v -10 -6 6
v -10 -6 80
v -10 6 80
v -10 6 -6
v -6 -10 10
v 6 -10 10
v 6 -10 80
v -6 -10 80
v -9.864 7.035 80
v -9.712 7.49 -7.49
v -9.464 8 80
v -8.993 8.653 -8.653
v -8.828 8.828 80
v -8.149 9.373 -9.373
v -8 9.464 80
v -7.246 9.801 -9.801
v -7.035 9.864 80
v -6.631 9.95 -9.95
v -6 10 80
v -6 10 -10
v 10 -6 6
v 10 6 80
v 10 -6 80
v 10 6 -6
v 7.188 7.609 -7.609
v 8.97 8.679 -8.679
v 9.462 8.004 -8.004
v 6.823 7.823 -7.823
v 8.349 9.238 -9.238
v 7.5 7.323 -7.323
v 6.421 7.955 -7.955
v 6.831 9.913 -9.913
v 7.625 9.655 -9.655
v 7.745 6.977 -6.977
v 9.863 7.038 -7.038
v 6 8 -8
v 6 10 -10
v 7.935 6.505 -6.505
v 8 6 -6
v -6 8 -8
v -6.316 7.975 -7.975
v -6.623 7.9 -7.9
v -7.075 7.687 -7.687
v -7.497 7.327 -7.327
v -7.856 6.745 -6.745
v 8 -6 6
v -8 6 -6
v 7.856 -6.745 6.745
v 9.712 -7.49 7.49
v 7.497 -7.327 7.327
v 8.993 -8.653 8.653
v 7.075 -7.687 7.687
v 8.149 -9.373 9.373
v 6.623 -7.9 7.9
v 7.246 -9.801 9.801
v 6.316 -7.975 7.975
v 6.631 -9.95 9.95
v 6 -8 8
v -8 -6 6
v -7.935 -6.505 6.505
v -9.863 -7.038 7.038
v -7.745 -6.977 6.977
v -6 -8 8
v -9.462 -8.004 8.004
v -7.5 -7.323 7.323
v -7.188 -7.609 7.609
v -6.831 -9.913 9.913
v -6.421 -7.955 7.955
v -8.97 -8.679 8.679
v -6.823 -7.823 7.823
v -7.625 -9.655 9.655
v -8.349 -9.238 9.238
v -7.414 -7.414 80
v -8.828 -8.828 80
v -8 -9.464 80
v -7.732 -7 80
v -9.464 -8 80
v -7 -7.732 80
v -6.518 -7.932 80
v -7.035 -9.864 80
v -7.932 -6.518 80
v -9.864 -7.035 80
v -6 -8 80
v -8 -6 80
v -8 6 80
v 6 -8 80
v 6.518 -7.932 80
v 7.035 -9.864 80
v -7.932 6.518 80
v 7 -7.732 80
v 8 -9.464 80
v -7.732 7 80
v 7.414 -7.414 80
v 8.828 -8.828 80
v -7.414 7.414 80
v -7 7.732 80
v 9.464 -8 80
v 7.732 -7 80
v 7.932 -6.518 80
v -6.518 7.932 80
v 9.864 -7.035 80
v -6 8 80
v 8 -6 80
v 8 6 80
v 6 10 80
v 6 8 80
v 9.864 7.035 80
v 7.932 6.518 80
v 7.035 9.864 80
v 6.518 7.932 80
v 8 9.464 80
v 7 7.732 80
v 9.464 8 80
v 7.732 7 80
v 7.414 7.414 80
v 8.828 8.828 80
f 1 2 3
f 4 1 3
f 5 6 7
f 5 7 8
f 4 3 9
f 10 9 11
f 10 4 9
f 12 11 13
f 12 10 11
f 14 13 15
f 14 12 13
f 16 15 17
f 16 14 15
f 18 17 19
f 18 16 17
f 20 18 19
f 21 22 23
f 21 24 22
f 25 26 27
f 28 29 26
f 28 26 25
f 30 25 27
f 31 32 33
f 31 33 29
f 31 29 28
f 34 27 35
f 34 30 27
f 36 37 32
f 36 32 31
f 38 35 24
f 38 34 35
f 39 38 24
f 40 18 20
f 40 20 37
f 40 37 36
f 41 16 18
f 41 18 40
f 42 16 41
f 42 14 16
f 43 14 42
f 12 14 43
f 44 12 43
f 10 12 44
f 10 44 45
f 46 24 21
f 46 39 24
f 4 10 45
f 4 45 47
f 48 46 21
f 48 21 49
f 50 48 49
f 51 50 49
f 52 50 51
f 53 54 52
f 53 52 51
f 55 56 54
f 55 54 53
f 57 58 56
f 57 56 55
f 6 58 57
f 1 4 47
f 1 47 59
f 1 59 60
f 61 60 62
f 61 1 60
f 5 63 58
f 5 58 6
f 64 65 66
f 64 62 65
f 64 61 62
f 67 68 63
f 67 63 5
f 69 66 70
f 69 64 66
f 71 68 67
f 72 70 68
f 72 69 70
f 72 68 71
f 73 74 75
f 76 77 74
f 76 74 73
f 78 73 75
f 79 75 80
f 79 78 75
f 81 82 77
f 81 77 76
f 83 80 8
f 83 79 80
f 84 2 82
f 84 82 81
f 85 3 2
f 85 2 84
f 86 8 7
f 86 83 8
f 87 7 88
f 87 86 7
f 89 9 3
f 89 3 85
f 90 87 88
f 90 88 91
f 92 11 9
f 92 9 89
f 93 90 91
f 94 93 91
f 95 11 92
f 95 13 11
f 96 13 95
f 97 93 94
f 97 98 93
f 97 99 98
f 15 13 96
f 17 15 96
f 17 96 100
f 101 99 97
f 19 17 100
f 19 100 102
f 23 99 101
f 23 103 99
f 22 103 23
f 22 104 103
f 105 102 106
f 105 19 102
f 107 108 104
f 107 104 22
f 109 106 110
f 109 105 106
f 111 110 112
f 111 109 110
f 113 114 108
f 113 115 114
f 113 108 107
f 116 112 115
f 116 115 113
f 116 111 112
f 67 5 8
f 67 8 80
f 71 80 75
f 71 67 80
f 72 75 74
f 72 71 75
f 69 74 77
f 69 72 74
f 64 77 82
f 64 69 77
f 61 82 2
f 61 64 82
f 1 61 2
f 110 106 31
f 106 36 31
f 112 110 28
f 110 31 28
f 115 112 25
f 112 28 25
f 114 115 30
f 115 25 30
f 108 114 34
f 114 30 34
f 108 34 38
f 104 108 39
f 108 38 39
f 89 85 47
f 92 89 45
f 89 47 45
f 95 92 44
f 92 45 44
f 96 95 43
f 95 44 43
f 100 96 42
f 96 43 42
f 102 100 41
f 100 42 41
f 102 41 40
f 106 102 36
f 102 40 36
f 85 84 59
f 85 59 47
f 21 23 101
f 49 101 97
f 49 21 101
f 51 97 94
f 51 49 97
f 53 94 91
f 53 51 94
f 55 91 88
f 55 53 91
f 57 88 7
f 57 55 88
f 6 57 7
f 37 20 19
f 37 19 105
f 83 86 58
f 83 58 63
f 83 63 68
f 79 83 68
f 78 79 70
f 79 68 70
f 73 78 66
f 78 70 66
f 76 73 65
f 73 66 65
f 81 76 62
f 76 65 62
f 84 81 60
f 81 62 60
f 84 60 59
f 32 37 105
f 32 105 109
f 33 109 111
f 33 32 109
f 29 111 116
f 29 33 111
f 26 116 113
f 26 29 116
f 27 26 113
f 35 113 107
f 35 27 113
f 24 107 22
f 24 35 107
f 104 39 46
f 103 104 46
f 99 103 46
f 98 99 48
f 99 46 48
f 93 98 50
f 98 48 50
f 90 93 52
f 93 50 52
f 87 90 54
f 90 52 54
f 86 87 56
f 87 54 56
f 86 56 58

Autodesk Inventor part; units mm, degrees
ref_plane "Start Plane" through (0, 0, -10) normal (0, 0, 1) x (1, 0, 0)
ref_plane "End Plane" through (0, 0, 80) normal (0, 0, 1) x (1, 0, 0)
sketch "Sketch" plane through (0, 0, 0) normal (0, 0, 1) x (1, 0, 0)
  line L0 (-10, -6) -> (-10, 6)
  line L1 (-6, 10) -> (6, 10)
  line L2 (10, 6) -> (10, -6)
  line L3 (6, -10) -> (-6, -10)
  arc A0 (-10, -6) -> (-6, -10) centre (-6, -6) ccw
  arc A1 (10, 6) -> (6, 10) centre (6, 6) ccw
  arc A2 (-6, 10) -> (-10, 6) centre (-6, 6) ccw
  arc A3 (6, -10) -> (10, -6) centre (6, -6) ccw
  arc A4 (-6, 8) -> (-8, 6) centre (-6, 6) ccw
  line L4 (-6, 8) -> (6, 8)
  arc A5 (8, 6) -> (6, 8) centre (6, 6) ccw
  line L5 (8, 6) -> (8, -6)
  arc A6 (6, -8) -> (8, -6) centre (6, -6) ccw
  line L6 (6, -8) -> (-6, -8)
  arc A7 (-8, -6) -> (-6, -8) centre (-6, -6) ccw
  line L7 (-8, -6) -> (-8, 6)
  line L8 (0, 15.1598) -> (0, -15.1598) construction
  line L9 (-15.1598, 0) -> (15.1598, 0) construction
  dimension "d7" = 4
  dimension "d9" = 20
  dimension "d11" = 20
  dimension "d12" = 2
  dimension "d15" = 10
  dimension "d16" = 10
extrude "Body" add sketch "Sketch" along normal up to surface (90 mm away) from surface at -10
sketch "Sketch3" plane through (0, 0, 0) normal (0, 0, 1) x (1, 0, 0)
  line L0 (0, 0) -> (10, 0)
ref_plane "Work Plane3" through (0, 0, 0) normal (0, -1, 0) x (1, 0, 0)
ref_plane "Work Plane4" through (0, 10, -10) normal (0, -0.7071, -0.7071) x (1, 0, 0)
split "Split1" plane through (0, 10, -10) removes the side toward (0, -0.7071, -0.7071)
sketch "Sketch4" plane through (0, 0, 0) normal (0, -1, 0) x (1, 0, 0)
  line L0 (-2, -10) -> (12, -10) projected
  line L1 (-2, 80) -> (12, 80) projected
  dimension "d18" = 90
equation "\"d7\" = G_IR"
equation "\"d9\" = G_W"
equation "\"d11\" = G_H"
equation "\"d12\" = G_T"
equation "\"d15\" = 0.5 * d9"
equation "\"d16\" = 0.5 * d11"
equation "\"d3\" = G_L"
equation "\"G_W\" = 20"
equation "\"G_H\" = 20"
equation "\"G_T\" = 2"
equation "\"G_IR\" = 4"
equation "\"G_L\" = d18"
equation "\"G_OFFSET_END\" = 0"
properties part number "ISO 10799-2 - 20x20x2 - 90" material "Steel"
